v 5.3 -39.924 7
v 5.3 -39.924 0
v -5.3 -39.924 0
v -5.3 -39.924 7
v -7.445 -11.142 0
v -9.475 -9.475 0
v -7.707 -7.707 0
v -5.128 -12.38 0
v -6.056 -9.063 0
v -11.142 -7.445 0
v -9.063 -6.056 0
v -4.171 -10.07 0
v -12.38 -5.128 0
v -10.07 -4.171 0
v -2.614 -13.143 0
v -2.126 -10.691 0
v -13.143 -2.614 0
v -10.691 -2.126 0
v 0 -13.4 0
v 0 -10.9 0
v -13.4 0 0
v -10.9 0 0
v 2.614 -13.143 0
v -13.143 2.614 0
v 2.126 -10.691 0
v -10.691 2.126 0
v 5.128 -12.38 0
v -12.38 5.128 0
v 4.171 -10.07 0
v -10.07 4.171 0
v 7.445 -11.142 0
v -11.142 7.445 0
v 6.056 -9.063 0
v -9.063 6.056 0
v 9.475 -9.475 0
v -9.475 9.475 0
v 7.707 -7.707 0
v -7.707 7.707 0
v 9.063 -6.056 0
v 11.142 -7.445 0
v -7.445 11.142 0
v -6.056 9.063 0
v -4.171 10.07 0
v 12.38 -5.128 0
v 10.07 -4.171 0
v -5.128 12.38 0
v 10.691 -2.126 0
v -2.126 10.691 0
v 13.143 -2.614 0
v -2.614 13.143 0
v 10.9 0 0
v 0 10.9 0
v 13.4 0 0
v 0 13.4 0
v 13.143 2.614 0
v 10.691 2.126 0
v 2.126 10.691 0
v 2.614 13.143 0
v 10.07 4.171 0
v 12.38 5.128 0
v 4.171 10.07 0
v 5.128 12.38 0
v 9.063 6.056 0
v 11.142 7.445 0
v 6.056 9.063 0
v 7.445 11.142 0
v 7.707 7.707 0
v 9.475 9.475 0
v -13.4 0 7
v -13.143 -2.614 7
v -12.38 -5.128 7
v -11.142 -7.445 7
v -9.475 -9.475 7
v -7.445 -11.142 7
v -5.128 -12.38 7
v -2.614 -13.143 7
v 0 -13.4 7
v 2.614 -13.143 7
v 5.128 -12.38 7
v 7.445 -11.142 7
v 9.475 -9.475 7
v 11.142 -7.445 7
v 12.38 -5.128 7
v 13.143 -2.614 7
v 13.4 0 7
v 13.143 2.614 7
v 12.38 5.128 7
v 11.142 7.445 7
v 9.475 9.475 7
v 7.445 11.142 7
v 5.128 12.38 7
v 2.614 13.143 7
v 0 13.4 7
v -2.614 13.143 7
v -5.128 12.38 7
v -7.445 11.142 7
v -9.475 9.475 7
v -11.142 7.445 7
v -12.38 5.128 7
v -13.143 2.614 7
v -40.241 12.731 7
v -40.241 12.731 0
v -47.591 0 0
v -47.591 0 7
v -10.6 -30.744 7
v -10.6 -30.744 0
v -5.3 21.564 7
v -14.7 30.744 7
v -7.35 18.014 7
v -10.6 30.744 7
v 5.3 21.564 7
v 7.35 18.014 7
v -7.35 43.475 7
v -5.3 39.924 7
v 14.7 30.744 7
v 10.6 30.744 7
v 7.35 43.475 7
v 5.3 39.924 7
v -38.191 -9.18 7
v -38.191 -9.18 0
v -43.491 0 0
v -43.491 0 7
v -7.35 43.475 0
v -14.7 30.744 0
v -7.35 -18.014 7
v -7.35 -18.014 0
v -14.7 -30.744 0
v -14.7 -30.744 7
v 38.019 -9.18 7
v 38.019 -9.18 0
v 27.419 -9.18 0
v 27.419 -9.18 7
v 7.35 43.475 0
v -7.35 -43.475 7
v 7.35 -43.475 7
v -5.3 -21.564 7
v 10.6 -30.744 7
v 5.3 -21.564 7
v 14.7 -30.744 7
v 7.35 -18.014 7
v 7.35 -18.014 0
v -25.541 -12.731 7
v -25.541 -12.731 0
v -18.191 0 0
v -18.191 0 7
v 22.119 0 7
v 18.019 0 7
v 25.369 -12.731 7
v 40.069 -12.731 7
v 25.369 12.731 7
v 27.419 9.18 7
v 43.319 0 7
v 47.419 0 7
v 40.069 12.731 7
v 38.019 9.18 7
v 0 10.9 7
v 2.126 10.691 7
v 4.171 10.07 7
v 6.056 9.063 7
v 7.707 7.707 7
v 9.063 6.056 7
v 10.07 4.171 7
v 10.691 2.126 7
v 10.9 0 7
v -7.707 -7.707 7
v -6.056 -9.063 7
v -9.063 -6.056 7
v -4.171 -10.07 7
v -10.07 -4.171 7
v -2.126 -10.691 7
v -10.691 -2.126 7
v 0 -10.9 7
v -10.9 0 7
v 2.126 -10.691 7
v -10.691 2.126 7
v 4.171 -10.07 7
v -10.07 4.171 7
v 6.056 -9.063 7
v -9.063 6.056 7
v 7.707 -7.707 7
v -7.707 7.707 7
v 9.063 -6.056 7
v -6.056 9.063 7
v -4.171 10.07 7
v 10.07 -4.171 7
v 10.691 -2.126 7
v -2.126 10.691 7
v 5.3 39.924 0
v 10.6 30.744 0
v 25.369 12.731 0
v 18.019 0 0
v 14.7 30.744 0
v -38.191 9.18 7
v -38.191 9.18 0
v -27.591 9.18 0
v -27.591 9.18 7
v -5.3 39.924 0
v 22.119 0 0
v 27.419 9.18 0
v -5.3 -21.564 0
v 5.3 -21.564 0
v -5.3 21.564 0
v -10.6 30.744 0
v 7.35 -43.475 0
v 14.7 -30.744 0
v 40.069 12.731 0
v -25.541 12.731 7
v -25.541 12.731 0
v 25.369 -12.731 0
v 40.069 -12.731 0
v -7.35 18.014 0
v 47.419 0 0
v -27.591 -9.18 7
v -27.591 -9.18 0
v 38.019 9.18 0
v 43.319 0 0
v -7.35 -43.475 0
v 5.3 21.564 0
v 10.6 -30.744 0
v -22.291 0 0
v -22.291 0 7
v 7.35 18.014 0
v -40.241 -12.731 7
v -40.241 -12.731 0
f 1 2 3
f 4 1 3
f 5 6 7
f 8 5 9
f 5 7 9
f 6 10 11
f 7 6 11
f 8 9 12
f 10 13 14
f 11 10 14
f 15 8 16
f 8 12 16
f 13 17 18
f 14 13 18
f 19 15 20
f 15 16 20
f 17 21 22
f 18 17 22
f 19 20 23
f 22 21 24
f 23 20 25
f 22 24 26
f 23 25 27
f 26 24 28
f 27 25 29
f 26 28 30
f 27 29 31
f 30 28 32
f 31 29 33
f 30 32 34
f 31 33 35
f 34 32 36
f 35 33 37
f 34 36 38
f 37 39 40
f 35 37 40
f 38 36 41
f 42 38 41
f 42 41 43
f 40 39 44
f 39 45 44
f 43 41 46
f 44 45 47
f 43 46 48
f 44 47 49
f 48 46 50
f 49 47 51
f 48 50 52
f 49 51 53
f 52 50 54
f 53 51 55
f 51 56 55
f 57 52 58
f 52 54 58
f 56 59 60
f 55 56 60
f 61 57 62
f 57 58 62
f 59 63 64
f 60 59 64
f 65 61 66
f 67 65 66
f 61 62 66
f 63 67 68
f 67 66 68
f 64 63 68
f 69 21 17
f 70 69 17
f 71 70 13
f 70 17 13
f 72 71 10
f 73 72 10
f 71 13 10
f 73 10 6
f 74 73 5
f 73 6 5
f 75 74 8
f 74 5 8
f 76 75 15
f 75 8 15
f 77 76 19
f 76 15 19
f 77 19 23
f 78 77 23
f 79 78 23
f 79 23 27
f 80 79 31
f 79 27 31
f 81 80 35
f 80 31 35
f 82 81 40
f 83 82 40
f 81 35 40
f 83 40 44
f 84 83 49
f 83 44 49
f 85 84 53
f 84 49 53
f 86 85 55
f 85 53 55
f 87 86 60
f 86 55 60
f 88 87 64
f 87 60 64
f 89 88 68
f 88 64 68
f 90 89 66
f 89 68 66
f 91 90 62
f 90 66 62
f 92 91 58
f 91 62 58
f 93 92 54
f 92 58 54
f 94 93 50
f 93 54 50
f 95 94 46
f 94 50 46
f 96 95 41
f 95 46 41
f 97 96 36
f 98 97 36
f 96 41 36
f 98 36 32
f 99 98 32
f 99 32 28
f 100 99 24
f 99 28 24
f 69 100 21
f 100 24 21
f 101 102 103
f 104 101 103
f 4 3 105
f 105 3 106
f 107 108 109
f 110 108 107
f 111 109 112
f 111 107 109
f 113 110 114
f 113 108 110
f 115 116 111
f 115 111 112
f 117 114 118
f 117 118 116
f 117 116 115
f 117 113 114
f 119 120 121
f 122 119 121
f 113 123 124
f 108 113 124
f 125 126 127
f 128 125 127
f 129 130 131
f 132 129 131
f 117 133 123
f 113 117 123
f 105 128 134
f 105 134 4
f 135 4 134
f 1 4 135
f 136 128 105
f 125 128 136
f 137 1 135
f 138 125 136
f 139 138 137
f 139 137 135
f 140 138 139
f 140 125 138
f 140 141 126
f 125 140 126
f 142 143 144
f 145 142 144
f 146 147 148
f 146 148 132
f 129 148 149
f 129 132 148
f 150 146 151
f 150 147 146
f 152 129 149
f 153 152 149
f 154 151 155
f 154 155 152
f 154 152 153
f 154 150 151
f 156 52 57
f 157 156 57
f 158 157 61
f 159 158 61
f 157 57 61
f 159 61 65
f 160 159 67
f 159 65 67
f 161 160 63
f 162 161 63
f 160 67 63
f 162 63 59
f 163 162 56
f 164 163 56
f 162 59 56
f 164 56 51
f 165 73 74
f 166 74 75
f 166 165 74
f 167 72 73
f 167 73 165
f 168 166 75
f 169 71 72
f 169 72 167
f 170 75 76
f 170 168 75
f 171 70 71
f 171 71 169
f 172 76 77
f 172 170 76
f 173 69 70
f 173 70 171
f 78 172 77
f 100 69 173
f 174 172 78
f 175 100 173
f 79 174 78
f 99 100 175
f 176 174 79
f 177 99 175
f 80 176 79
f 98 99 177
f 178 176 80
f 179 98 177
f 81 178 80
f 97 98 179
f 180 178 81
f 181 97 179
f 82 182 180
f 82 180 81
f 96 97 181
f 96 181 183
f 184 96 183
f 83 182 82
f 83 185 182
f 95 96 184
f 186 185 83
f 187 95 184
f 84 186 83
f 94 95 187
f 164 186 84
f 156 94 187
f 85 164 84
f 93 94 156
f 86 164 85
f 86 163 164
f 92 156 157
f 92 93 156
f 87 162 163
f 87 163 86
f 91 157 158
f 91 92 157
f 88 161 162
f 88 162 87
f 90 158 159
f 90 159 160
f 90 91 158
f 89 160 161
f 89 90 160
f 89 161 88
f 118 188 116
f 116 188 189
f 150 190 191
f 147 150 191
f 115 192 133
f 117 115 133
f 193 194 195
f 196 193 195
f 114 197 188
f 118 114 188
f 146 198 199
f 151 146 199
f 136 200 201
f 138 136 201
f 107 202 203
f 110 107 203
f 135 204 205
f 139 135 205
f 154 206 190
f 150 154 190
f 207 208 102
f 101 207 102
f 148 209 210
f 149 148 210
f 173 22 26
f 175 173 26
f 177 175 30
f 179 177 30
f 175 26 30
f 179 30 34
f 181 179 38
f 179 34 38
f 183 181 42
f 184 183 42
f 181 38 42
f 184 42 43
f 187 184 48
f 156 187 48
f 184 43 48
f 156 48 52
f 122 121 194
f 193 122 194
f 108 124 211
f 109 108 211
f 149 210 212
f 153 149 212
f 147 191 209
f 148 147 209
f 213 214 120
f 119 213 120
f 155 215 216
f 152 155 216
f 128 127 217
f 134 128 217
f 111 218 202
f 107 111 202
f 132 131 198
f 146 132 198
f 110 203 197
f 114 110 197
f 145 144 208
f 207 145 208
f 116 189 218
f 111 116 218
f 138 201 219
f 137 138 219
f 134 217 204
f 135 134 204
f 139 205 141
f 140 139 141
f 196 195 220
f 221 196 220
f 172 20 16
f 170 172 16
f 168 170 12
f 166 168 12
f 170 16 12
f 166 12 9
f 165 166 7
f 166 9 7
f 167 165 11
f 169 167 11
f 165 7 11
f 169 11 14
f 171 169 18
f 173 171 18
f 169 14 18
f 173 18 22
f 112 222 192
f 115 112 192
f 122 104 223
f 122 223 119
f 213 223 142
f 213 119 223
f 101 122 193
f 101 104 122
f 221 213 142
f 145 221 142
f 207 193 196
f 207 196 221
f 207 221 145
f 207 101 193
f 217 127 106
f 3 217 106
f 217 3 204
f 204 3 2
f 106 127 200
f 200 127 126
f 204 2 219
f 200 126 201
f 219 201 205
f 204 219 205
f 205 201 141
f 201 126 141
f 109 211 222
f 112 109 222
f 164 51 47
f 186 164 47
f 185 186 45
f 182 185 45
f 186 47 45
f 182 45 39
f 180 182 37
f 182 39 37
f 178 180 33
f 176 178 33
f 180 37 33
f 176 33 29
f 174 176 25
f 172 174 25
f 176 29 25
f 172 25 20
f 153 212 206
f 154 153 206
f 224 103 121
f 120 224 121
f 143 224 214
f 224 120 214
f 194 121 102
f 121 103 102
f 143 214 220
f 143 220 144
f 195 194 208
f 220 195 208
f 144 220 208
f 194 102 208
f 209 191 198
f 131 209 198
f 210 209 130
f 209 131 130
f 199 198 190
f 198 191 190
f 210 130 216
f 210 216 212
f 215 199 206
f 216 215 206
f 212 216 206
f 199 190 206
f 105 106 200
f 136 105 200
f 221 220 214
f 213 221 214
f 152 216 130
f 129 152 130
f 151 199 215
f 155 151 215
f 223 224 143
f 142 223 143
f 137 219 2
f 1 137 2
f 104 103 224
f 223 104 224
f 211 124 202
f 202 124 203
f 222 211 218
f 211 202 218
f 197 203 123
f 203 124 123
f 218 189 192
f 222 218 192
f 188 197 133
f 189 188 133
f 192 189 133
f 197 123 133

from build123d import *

# Parameters (mm, degrees)
F1_DEPTH = 7


# Not quite as in the source:
# - a feature names something its author has since deleted; it is built from what else it names


with BuildPart() as f1:
    # F0 (on Top) → F1 (new body)
    with BuildSketch(Plane.XY):
        Polygon((-25.5412213445, 12.7305734356), (-40.2412213445, 12.7305734356), (-47.5912213445, 0), (-40.2412213445, -12.7305734356), (-25.5412213445, -12.7305734356), (-18.1912213445, 0), align=None)
        Polygon((-43.4912213445, 0), (-38.1912213445, 9.1798692801), (-27.5912213445, 9.1798692801), (-22.2912213445, 0), (-27.5912213445, -9.1798692801), (-38.1912213445, -9.1798692801), align=None, mode=Mode.SUBTRACT)
    extrude(amount=F1_DEPTH)


with BuildPart() as f1b:
    # F0 (on Top) → F1, piece 2 (new body)
    with BuildSketch(Plane.XY):
        with BuildLine():
            ThreePointArc((-10.9, 0), (-7.7074639149, 7.7074639149), (0, 10.9))
            Line((0, 10.9), (0, 13.4))
            ThreePointArc((0, 13.4), (-9.4752308679, 9.4752308679), (-13.4, 0))
            Line((-13.4, 0), (-10.9, 0))
        make_face()
        with BuildLine():
            ThreePointArc((0, 10.9), (7.7074639149, 7.7074639149), (10.9, 0))
            Line((10.9, 0), (13.4, 0))
            ThreePointArc((13.4, 0), (9.4752308679, 9.4752308679), (0, 13.4))
            Line((0, 13.4), (0, 10.9))
        make_face()
        with BuildLine():
            Line((13.4, 0), (10.9, 0))
            ThreePointArc((10.9, 0), (7.7074639149, -7.7074639149), (0, -10.9))
            Line((0, -10.9), (0, -13.4))
            ThreePointArc((0, -13.4), (9.4752308679, -9.4752308679), (13.4, 0))
        make_face()
        with BuildLine():
            Line((0, -13.4), (0, -10.9))
            ThreePointArc((0, -10.9), (-7.7074639149, -7.7074639149), (-10.9, 0))
            Line((-10.9, 0), (-13.4, 0))
            ThreePointArc((-13.4, 0), (-9.4752308679, -9.4752308679), (0, -13.4))
        make_face()
    extrude(amount=F1_DEPTH)


with BuildPart() as f1c:
    # F0 (on Top) → F1, piece 3 (new body)
    with BuildSketch(Plane.XY):
        Polygon((7.35, -18.0137016425), (-7.35, -18.0137016425), (-14.7, -30.7442750782), (-7.35, -43.4748485138), (7.35, -43.4748485138), (14.7, -30.7442750782), align=None)
        Polygon((-10.6, -30.7442750782), (-5.3, -21.5644057981), (5.3, -21.5644057981), (10.6, -30.7442750782), (5.3, -39.9241443583), (-5.3, -39.9241443583), align=None, mode=Mode.SUBTRACT)
    extrude(amount=F1_DEPTH)


with BuildPart() as f1d:
    # F0 (on Top) → F1, piece 4 (new body)
    with BuildSketch(Plane.XY):
        Polygon((40.0694668353, 12.7305734356), (25.3694668353, 12.7305734356), (18.0194668353, 0), (25.3694668353, -12.7305734356), (40.0694668353, -12.7305734356), (47.4194668353, 0), align=None)
        Polygon((22.1194668353, 0), (27.4194668353, 9.1798692801), (38.0194668353, 9.1798692801), (43.3194668353, 0), (38.0194668353, -9.1798692801), (27.4194668353, -9.1798692801), align=None, mode=Mode.SUBTRACT)
    extrude(amount=F1_DEPTH)


with BuildPart() as f1e:
    # F0 (on Top) → F1, piece 5 (new body)
    with BuildSketch(Plane.XY):
        Polygon((7.35, 43.4748485138), (-7.35, 43.4748485138), (-14.7, 30.7442750782), (-7.35, 18.0137016425), (7.35, 18.0137016425), (14.7, 30.7442750782), align=None)
        Polygon((-10.6, 30.7442750782), (-5.3, 39.9241443583), (5.3, 39.9241443583), (10.6, 30.7442750782), (5.3, 21.5644057981), (-5.3, 21.5644057981), align=None, mode=Mode.SUBTRACT)
    extrude(amount=F1_DEPTH)


solid = Compound([f1.part, f1b.part, f1c.part, f1d.part, f1e.part])
